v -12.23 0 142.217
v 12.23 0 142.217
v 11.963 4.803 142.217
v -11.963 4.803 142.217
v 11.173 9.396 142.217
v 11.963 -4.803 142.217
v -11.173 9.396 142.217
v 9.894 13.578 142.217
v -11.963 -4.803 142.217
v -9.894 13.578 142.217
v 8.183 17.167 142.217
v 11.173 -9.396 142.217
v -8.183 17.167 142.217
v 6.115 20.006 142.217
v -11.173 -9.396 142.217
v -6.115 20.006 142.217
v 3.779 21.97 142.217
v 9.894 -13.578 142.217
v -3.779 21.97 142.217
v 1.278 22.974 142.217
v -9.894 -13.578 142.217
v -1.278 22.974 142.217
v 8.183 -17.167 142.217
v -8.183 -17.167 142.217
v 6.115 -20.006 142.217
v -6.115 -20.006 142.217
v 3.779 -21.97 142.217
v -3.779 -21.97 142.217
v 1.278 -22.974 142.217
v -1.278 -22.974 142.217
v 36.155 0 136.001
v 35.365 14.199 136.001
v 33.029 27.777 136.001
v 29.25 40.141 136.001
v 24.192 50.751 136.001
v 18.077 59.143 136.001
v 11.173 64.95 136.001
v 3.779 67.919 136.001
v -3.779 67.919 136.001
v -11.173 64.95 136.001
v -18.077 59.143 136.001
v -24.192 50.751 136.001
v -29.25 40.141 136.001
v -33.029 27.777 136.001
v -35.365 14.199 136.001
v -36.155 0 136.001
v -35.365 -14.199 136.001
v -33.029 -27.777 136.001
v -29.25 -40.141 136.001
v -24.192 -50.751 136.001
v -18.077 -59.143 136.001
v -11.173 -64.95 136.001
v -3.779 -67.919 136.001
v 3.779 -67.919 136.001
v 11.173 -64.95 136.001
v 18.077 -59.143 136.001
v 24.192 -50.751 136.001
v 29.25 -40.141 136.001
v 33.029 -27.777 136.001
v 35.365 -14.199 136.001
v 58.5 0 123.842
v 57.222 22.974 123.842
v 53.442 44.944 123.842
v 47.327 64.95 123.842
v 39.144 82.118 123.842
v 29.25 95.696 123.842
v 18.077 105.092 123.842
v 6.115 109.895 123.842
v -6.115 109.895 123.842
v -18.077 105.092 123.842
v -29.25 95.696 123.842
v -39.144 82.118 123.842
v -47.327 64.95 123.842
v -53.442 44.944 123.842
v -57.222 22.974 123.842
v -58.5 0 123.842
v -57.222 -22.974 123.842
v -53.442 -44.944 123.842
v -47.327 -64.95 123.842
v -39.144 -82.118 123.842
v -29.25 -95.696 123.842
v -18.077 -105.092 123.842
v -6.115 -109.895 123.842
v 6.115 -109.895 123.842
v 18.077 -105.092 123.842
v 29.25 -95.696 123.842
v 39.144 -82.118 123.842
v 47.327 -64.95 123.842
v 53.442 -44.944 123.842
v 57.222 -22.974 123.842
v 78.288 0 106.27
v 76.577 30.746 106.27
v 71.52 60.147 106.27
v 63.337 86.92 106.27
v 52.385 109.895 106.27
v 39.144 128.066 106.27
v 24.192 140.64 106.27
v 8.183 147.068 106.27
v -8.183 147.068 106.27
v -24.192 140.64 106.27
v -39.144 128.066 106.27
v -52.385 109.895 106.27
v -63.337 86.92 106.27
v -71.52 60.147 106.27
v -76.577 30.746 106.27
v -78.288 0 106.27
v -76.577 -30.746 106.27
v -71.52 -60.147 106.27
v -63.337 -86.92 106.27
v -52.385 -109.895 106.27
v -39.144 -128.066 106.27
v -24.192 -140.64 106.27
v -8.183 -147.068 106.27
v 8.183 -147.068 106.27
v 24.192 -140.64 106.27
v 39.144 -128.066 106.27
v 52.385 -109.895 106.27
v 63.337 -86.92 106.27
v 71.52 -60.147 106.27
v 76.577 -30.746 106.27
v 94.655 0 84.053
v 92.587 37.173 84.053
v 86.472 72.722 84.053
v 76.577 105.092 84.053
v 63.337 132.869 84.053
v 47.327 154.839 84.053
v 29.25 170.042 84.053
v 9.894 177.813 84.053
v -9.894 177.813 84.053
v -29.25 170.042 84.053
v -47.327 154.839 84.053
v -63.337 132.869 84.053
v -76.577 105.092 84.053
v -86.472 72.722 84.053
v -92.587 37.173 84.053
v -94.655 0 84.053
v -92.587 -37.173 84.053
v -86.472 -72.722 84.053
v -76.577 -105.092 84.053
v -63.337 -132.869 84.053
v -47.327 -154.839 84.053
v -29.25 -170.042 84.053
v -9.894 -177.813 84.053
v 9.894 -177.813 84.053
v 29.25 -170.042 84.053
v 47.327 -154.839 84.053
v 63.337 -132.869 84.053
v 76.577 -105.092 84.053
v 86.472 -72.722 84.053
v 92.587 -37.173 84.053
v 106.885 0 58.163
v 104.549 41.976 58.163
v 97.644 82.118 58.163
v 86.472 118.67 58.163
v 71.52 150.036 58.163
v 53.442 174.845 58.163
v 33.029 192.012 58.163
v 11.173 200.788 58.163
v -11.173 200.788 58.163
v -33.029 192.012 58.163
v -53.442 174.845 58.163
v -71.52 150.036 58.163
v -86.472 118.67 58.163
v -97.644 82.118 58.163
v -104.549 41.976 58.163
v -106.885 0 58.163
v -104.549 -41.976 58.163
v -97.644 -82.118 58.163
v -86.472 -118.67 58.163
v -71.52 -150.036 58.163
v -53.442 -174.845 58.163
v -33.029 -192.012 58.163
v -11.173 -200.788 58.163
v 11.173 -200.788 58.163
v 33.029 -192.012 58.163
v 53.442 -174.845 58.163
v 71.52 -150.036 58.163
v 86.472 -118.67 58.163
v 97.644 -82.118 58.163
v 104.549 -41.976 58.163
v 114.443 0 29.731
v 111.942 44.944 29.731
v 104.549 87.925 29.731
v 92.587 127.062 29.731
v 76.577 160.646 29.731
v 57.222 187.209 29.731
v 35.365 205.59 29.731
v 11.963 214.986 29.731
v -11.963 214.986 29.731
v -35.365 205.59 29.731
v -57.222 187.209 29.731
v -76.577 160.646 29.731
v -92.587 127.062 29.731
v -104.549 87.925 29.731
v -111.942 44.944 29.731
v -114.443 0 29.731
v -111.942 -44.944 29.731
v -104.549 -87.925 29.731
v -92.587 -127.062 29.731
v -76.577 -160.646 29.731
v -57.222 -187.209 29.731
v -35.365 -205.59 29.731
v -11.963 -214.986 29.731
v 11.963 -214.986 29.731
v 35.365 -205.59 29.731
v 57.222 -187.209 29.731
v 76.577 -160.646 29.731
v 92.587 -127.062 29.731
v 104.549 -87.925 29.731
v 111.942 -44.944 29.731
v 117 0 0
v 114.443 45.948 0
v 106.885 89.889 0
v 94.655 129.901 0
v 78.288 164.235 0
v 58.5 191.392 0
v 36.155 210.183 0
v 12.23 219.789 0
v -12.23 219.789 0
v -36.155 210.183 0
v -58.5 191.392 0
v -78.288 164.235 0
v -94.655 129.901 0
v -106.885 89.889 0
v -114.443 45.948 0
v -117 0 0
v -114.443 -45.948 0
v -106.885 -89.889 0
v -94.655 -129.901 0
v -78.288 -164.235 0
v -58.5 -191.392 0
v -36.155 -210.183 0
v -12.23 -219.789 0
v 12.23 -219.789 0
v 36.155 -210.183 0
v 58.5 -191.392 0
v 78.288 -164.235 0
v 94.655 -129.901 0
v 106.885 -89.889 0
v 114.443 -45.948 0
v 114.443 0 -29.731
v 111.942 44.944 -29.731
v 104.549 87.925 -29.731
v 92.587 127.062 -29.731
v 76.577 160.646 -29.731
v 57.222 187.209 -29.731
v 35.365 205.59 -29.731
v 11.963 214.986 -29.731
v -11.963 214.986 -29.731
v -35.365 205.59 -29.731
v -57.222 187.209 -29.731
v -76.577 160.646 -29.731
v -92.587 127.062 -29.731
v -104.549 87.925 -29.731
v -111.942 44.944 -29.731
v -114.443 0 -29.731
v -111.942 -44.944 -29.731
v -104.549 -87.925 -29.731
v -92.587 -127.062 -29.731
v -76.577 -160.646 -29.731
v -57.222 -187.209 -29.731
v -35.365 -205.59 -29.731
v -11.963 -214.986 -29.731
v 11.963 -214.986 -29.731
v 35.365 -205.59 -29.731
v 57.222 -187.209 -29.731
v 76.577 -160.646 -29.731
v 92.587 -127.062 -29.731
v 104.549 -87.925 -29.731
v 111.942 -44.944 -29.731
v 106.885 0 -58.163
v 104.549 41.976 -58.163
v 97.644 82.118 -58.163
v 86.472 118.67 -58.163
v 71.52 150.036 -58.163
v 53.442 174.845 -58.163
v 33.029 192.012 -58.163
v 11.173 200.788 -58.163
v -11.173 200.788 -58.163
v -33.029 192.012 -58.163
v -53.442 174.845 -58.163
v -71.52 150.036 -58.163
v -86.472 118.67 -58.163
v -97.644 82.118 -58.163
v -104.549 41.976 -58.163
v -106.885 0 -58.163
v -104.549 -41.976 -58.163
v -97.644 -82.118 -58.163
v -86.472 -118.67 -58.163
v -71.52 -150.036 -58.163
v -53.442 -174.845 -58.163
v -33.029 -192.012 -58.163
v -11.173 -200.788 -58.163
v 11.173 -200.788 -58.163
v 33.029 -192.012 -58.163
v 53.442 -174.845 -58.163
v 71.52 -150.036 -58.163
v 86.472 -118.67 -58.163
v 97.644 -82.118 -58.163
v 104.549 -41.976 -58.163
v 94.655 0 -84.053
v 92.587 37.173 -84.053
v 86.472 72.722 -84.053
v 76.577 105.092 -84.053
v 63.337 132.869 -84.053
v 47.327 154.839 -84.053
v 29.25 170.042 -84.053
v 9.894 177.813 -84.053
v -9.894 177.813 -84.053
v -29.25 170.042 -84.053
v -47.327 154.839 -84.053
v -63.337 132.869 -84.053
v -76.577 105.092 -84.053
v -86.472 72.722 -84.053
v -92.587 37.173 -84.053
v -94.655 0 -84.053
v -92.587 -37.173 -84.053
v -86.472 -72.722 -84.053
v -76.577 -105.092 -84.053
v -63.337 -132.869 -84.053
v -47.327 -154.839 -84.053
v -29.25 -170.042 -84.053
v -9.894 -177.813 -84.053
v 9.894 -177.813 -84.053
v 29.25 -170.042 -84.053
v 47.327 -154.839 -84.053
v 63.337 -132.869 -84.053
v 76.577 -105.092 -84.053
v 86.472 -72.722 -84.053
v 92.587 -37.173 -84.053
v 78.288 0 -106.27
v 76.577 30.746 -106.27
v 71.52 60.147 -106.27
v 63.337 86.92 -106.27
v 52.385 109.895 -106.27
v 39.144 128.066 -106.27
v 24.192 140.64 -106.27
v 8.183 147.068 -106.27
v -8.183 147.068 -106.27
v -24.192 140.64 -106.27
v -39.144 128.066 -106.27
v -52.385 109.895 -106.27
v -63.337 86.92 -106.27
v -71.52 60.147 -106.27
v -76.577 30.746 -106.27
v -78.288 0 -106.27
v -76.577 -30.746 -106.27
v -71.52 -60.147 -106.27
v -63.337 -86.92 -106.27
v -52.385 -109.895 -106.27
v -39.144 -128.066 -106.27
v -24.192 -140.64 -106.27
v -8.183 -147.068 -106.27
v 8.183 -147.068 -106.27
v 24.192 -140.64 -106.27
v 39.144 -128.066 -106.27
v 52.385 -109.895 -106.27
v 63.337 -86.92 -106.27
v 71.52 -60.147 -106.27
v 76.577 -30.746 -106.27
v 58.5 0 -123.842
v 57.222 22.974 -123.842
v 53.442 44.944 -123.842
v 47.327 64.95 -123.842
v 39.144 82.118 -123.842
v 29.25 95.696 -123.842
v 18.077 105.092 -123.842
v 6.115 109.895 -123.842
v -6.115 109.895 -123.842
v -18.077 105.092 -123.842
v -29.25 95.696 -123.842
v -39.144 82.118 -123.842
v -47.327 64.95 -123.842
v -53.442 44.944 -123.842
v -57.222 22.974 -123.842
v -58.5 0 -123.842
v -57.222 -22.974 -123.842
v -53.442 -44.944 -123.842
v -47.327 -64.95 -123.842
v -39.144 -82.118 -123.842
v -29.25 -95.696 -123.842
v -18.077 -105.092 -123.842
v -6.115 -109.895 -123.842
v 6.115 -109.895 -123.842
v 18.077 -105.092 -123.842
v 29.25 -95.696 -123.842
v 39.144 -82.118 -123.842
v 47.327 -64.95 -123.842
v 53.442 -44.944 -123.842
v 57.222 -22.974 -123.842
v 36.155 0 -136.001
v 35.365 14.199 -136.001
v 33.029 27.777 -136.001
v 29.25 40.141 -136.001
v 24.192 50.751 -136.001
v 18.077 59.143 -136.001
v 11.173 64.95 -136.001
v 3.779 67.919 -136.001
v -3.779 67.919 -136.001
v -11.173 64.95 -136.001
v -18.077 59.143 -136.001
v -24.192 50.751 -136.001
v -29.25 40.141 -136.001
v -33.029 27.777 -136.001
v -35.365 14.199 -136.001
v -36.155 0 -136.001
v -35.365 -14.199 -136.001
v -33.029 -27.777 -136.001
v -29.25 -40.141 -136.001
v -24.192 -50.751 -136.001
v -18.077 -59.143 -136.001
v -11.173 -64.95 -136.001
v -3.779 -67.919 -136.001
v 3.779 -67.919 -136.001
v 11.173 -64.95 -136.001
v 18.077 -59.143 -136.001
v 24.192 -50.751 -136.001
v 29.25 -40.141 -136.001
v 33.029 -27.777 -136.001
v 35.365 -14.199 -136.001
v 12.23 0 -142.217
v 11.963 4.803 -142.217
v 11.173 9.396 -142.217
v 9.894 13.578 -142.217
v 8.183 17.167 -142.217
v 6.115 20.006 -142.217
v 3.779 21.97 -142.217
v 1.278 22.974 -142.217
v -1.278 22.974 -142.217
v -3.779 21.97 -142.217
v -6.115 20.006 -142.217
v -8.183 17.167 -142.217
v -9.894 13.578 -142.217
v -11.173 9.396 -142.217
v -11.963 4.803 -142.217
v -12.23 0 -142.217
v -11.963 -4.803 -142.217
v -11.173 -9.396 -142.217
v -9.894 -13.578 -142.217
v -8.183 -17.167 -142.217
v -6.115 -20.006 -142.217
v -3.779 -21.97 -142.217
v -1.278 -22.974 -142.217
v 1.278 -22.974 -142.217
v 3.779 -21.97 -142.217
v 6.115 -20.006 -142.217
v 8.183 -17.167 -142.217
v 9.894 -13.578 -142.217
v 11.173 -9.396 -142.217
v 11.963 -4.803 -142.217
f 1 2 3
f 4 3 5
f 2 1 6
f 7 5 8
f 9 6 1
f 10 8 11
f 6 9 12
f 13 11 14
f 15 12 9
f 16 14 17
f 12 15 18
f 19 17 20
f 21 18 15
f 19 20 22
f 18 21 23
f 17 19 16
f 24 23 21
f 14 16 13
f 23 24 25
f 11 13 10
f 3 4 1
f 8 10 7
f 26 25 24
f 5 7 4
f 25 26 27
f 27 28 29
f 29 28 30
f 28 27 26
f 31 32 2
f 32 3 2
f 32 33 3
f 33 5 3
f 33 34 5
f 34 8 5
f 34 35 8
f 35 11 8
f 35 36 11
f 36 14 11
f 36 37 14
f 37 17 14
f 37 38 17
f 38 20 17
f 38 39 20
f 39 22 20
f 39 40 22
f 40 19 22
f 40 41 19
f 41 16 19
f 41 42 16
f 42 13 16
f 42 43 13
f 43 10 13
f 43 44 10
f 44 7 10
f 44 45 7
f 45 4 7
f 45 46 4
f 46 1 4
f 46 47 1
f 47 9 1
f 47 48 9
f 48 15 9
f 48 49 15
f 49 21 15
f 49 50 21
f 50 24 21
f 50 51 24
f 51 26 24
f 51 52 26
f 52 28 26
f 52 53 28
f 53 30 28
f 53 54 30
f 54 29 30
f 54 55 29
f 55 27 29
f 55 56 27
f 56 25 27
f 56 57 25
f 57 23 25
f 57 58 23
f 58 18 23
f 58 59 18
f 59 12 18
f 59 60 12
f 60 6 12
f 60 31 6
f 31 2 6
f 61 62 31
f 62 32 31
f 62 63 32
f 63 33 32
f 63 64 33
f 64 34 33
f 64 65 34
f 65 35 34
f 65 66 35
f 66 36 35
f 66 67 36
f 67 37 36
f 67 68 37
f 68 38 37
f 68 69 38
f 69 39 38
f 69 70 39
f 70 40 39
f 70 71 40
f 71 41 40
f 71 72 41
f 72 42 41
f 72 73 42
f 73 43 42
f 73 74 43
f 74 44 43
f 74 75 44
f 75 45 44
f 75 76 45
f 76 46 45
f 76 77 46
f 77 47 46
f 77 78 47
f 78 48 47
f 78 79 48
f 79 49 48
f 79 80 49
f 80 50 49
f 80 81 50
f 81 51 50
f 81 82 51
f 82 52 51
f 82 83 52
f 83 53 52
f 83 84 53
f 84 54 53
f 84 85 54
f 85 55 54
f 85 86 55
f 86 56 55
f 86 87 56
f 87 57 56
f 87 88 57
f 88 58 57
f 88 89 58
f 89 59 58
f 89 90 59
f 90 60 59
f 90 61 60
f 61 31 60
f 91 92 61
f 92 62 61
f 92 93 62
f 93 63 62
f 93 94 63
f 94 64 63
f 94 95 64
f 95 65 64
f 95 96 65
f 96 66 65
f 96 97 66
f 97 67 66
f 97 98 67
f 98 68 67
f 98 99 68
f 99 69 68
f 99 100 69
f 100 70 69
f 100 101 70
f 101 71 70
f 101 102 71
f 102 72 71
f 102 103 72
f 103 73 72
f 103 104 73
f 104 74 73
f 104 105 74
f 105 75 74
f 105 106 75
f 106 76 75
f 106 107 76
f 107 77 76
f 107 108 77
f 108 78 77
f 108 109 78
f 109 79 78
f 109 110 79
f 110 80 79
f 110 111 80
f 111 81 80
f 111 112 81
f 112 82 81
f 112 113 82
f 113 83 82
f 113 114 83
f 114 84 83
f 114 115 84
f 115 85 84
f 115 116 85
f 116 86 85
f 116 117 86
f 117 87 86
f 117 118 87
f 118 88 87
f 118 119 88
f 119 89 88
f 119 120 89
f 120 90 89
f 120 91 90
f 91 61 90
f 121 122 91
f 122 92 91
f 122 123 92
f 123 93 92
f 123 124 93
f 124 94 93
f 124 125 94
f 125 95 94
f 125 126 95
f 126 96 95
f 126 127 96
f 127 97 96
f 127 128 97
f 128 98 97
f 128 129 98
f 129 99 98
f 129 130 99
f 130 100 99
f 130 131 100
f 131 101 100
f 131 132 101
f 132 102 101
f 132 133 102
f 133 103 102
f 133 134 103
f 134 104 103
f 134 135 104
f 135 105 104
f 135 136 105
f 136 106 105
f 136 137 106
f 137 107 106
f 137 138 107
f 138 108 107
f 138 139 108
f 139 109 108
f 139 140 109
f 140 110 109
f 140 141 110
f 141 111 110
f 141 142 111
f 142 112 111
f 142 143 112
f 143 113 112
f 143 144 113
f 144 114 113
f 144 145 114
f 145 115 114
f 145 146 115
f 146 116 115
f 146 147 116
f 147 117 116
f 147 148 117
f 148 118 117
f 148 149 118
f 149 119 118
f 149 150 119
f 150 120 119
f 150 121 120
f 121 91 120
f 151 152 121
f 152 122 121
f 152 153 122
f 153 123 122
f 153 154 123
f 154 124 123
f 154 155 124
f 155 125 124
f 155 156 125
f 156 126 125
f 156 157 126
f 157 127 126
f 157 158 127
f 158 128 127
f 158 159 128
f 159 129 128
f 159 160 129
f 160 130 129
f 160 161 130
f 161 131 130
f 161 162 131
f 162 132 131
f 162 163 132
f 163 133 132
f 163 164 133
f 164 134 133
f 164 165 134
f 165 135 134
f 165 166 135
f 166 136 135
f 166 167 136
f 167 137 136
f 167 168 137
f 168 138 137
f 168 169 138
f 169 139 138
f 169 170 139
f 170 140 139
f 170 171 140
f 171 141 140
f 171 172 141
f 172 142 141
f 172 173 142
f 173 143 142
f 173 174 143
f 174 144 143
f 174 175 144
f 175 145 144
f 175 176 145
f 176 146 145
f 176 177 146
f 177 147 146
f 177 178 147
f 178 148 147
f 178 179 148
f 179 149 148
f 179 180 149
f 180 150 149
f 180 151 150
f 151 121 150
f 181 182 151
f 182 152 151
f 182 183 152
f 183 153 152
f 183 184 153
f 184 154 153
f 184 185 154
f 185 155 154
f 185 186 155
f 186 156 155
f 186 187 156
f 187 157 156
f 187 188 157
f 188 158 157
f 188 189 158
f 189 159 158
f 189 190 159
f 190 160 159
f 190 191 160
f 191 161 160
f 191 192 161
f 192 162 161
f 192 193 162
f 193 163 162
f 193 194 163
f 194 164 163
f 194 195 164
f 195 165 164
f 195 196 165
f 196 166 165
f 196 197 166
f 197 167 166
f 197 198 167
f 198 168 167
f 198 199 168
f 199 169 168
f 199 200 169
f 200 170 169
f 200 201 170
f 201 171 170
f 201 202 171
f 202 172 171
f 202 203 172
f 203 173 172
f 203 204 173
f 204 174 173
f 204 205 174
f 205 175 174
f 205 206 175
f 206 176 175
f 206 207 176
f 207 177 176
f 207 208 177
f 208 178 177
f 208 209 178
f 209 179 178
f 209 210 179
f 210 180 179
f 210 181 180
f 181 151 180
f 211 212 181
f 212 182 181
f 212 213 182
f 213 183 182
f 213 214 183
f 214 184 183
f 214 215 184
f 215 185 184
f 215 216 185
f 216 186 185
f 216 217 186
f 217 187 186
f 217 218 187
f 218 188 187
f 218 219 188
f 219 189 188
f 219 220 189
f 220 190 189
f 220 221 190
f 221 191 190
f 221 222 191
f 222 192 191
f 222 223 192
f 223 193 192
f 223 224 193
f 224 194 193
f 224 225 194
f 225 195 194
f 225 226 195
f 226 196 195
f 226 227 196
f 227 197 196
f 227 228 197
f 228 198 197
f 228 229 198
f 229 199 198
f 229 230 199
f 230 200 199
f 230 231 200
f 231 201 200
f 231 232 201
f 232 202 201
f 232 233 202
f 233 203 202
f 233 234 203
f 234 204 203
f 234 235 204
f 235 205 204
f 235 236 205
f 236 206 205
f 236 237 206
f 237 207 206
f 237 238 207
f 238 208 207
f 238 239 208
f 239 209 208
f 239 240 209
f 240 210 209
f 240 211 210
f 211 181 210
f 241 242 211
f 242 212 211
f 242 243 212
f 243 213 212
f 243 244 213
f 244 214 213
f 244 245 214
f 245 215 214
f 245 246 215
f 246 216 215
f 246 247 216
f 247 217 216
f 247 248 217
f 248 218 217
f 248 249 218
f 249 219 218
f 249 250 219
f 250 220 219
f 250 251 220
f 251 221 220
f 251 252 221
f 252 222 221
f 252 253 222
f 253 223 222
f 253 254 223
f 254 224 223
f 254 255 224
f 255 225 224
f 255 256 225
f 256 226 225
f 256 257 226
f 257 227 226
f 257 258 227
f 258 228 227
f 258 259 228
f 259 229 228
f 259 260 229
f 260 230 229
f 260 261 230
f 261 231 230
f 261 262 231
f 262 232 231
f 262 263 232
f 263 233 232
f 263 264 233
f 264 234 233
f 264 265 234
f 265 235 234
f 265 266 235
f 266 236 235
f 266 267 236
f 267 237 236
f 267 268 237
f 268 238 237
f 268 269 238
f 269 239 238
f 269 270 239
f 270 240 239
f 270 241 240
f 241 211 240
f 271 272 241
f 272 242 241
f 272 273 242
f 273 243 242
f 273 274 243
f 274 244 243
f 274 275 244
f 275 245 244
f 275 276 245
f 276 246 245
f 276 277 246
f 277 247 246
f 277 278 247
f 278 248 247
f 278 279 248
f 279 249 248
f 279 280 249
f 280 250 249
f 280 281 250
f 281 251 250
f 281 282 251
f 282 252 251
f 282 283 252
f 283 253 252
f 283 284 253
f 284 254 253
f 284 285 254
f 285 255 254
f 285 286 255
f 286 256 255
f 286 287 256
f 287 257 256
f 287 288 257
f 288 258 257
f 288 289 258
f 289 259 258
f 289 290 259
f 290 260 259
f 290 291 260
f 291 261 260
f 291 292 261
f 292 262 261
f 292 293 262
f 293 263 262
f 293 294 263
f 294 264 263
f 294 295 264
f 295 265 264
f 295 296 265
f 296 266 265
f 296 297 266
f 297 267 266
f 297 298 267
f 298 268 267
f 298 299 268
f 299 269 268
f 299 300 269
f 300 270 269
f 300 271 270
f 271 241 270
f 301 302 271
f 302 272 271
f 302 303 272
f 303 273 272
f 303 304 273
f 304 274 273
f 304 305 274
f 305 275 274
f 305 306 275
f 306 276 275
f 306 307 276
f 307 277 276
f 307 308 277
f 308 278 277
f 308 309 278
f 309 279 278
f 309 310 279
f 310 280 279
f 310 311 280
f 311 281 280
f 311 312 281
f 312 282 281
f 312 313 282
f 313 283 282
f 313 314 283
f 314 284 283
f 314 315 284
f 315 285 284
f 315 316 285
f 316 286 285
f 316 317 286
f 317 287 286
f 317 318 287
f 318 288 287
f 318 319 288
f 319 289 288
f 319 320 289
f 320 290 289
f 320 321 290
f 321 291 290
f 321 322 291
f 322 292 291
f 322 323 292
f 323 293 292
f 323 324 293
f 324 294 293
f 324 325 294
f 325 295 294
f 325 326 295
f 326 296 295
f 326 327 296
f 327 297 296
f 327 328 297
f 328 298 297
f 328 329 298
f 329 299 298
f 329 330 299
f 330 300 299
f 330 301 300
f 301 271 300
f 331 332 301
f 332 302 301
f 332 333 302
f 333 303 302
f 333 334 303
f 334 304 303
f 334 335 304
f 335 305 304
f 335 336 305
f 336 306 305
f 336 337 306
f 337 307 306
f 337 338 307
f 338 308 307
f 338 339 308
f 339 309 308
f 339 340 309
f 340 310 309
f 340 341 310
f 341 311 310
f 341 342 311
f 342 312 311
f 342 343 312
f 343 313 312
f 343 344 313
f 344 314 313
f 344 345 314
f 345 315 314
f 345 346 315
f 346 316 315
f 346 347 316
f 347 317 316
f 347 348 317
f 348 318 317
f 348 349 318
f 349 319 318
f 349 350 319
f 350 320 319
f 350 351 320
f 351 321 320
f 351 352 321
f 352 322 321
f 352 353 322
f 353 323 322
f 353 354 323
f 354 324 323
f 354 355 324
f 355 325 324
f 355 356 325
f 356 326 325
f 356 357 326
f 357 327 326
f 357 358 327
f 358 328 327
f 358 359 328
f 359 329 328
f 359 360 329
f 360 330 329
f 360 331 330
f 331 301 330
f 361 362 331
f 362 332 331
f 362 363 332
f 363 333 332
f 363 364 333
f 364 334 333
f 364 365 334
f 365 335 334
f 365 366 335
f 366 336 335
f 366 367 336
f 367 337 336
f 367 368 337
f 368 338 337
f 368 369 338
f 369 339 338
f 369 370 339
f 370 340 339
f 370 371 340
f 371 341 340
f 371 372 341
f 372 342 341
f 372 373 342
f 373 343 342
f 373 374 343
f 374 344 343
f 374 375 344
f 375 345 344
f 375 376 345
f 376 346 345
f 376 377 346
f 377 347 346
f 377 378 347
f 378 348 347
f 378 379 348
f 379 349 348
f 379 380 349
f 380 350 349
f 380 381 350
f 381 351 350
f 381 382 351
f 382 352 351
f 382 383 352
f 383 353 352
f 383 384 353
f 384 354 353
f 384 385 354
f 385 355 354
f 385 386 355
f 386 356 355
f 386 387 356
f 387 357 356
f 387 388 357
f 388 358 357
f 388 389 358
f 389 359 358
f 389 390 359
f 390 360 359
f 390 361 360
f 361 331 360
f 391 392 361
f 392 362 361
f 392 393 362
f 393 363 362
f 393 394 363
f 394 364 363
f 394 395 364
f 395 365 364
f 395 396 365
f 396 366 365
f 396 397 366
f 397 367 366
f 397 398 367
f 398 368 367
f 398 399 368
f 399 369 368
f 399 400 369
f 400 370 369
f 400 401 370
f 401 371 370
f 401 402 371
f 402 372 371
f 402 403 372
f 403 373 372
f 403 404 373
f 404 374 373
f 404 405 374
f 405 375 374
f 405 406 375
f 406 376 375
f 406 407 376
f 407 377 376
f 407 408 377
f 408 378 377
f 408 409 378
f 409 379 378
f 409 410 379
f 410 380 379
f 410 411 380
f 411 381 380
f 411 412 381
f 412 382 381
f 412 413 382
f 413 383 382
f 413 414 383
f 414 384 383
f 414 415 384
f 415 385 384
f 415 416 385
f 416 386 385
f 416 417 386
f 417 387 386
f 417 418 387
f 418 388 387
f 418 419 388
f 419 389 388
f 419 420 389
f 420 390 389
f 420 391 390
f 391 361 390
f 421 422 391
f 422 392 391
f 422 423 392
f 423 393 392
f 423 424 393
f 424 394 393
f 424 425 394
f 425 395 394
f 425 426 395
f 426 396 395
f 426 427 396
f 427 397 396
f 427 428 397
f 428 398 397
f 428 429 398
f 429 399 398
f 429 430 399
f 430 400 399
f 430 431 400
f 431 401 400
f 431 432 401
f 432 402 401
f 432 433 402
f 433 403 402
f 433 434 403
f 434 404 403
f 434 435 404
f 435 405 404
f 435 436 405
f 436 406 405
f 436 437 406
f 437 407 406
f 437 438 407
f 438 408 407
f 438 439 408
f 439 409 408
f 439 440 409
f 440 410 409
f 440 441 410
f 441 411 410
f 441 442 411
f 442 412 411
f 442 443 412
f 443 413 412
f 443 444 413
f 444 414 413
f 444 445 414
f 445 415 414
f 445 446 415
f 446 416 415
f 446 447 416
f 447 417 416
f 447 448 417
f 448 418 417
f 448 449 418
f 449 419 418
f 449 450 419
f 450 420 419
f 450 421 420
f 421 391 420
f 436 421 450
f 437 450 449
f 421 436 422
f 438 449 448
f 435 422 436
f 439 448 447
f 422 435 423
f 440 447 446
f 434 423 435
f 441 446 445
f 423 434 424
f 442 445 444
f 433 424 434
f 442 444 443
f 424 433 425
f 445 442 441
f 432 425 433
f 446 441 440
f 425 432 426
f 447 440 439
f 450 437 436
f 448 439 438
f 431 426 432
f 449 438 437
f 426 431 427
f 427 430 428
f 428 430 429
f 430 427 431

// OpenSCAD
// Generated by SolidPython 1.0.1 on 2020-07-29 00:46:49


scale(v = [9, 17, 11]) {
	sphere(r = 13);
}
/***********************************************
*********      SolidPython code:      **********
************************************************
 
# import packages: SolidPython
from solid import *
from solid.utils import *
from itertools import chain, combinations, permutations


class Resize:

    def __init__(self, scad_file):
        self.scad_file = scad_file
        #self.scad_file = import_scad(scad_file)
        # cone/cylinder param:
        self.r1 = 0
        self.r2 = 0
        self.h = 0
        # rectangular prism param:
        self.w = 0
        self.l = 0
        # ellipse param:
        self.r = 0

    # import OpenScad code (file name corresponds to shape)


    # classify shape + parameters
    def assign(self, param1, param2, param3):
        if self.scad_file == 'cone.scad':
            self.r1 = param1
            self.r2 = param2
            self.h = param3
        elif self.scad_file == 'cylinder.scad':
            self.r1 = param1
            self.r2 = param2
            self.h = param3
        elif self.scad_file == 'rectangularPrism.scad':
            self.h = param1
            self.l = param2
            self.w = param3
        else:
            self.r = param1
            self.h = param2

    # resize parameters
    def iterate(self):
        x = range(3, 20, 2)
        i = 1
        if self.scad_file == 'cone.scad':
            tempList = list(permutations(x, 2))
            for temp in tempList:
                param1 = temp[0]
                param2 = temp[1]
                filepath = 'produced_scad_files/' + 'cone' + str(param1) + '_' + str(param2) + '_' + '.scad'
                scad_render_to_file(cylinder(h=param1, r1=param2, r2=0), filepath)

        elif self.scad_file == 'cylinder.scad':
            tempList = list(permutations(x, 3))
            for temp in tempList:
                param1 = temp[0]
                param2 = temp[1]
                filepath = 'produced_scad_files/' + 'cylinder' + str(param1) + '_' + str(param2) + '_' + '.scad'
                scad_render_to_file(cylinder(h=param1, r1=param2, r2=param2), filepath)

        elif self.scad_file == 'rectangularPrism.scad':
            tempList = list(permutations(x, 3))
            for temp in tempList:
                param1 = temp[0]
                param2 = temp[1]
                param3 = temp[2]
                filepath = 'produced_scad_files/' + 'rectangularPrism' + str(param1) + '_' + str(param2) + '_' + str(
                    param3) + '.scad'
                scad_render_to_file(cube(size=(param1, param2, param3)), filepath)

        elif self.scad_file == 'ellipse.scad':
            tempList = list(permutations(x, 4))
            for temp in tempList:
                param1 = temp[0]
                param2 = temp[1]
                param3 = temp[2]
                param4 = temp[3]
                filepath = 'produced_scad_files/' + 'ellipse' + str(param1) + '_' + str(param2) + '_' + str(param3) + '_' + str(param4) + '.scad'
                scad_render_to_file(scale([param1, param2, param3])(sphere(r=param4)), filepath)

    def render_to_scadfile(self):
        scad_render_to_file(scad, 'example.scad') 
 
************************************************/
